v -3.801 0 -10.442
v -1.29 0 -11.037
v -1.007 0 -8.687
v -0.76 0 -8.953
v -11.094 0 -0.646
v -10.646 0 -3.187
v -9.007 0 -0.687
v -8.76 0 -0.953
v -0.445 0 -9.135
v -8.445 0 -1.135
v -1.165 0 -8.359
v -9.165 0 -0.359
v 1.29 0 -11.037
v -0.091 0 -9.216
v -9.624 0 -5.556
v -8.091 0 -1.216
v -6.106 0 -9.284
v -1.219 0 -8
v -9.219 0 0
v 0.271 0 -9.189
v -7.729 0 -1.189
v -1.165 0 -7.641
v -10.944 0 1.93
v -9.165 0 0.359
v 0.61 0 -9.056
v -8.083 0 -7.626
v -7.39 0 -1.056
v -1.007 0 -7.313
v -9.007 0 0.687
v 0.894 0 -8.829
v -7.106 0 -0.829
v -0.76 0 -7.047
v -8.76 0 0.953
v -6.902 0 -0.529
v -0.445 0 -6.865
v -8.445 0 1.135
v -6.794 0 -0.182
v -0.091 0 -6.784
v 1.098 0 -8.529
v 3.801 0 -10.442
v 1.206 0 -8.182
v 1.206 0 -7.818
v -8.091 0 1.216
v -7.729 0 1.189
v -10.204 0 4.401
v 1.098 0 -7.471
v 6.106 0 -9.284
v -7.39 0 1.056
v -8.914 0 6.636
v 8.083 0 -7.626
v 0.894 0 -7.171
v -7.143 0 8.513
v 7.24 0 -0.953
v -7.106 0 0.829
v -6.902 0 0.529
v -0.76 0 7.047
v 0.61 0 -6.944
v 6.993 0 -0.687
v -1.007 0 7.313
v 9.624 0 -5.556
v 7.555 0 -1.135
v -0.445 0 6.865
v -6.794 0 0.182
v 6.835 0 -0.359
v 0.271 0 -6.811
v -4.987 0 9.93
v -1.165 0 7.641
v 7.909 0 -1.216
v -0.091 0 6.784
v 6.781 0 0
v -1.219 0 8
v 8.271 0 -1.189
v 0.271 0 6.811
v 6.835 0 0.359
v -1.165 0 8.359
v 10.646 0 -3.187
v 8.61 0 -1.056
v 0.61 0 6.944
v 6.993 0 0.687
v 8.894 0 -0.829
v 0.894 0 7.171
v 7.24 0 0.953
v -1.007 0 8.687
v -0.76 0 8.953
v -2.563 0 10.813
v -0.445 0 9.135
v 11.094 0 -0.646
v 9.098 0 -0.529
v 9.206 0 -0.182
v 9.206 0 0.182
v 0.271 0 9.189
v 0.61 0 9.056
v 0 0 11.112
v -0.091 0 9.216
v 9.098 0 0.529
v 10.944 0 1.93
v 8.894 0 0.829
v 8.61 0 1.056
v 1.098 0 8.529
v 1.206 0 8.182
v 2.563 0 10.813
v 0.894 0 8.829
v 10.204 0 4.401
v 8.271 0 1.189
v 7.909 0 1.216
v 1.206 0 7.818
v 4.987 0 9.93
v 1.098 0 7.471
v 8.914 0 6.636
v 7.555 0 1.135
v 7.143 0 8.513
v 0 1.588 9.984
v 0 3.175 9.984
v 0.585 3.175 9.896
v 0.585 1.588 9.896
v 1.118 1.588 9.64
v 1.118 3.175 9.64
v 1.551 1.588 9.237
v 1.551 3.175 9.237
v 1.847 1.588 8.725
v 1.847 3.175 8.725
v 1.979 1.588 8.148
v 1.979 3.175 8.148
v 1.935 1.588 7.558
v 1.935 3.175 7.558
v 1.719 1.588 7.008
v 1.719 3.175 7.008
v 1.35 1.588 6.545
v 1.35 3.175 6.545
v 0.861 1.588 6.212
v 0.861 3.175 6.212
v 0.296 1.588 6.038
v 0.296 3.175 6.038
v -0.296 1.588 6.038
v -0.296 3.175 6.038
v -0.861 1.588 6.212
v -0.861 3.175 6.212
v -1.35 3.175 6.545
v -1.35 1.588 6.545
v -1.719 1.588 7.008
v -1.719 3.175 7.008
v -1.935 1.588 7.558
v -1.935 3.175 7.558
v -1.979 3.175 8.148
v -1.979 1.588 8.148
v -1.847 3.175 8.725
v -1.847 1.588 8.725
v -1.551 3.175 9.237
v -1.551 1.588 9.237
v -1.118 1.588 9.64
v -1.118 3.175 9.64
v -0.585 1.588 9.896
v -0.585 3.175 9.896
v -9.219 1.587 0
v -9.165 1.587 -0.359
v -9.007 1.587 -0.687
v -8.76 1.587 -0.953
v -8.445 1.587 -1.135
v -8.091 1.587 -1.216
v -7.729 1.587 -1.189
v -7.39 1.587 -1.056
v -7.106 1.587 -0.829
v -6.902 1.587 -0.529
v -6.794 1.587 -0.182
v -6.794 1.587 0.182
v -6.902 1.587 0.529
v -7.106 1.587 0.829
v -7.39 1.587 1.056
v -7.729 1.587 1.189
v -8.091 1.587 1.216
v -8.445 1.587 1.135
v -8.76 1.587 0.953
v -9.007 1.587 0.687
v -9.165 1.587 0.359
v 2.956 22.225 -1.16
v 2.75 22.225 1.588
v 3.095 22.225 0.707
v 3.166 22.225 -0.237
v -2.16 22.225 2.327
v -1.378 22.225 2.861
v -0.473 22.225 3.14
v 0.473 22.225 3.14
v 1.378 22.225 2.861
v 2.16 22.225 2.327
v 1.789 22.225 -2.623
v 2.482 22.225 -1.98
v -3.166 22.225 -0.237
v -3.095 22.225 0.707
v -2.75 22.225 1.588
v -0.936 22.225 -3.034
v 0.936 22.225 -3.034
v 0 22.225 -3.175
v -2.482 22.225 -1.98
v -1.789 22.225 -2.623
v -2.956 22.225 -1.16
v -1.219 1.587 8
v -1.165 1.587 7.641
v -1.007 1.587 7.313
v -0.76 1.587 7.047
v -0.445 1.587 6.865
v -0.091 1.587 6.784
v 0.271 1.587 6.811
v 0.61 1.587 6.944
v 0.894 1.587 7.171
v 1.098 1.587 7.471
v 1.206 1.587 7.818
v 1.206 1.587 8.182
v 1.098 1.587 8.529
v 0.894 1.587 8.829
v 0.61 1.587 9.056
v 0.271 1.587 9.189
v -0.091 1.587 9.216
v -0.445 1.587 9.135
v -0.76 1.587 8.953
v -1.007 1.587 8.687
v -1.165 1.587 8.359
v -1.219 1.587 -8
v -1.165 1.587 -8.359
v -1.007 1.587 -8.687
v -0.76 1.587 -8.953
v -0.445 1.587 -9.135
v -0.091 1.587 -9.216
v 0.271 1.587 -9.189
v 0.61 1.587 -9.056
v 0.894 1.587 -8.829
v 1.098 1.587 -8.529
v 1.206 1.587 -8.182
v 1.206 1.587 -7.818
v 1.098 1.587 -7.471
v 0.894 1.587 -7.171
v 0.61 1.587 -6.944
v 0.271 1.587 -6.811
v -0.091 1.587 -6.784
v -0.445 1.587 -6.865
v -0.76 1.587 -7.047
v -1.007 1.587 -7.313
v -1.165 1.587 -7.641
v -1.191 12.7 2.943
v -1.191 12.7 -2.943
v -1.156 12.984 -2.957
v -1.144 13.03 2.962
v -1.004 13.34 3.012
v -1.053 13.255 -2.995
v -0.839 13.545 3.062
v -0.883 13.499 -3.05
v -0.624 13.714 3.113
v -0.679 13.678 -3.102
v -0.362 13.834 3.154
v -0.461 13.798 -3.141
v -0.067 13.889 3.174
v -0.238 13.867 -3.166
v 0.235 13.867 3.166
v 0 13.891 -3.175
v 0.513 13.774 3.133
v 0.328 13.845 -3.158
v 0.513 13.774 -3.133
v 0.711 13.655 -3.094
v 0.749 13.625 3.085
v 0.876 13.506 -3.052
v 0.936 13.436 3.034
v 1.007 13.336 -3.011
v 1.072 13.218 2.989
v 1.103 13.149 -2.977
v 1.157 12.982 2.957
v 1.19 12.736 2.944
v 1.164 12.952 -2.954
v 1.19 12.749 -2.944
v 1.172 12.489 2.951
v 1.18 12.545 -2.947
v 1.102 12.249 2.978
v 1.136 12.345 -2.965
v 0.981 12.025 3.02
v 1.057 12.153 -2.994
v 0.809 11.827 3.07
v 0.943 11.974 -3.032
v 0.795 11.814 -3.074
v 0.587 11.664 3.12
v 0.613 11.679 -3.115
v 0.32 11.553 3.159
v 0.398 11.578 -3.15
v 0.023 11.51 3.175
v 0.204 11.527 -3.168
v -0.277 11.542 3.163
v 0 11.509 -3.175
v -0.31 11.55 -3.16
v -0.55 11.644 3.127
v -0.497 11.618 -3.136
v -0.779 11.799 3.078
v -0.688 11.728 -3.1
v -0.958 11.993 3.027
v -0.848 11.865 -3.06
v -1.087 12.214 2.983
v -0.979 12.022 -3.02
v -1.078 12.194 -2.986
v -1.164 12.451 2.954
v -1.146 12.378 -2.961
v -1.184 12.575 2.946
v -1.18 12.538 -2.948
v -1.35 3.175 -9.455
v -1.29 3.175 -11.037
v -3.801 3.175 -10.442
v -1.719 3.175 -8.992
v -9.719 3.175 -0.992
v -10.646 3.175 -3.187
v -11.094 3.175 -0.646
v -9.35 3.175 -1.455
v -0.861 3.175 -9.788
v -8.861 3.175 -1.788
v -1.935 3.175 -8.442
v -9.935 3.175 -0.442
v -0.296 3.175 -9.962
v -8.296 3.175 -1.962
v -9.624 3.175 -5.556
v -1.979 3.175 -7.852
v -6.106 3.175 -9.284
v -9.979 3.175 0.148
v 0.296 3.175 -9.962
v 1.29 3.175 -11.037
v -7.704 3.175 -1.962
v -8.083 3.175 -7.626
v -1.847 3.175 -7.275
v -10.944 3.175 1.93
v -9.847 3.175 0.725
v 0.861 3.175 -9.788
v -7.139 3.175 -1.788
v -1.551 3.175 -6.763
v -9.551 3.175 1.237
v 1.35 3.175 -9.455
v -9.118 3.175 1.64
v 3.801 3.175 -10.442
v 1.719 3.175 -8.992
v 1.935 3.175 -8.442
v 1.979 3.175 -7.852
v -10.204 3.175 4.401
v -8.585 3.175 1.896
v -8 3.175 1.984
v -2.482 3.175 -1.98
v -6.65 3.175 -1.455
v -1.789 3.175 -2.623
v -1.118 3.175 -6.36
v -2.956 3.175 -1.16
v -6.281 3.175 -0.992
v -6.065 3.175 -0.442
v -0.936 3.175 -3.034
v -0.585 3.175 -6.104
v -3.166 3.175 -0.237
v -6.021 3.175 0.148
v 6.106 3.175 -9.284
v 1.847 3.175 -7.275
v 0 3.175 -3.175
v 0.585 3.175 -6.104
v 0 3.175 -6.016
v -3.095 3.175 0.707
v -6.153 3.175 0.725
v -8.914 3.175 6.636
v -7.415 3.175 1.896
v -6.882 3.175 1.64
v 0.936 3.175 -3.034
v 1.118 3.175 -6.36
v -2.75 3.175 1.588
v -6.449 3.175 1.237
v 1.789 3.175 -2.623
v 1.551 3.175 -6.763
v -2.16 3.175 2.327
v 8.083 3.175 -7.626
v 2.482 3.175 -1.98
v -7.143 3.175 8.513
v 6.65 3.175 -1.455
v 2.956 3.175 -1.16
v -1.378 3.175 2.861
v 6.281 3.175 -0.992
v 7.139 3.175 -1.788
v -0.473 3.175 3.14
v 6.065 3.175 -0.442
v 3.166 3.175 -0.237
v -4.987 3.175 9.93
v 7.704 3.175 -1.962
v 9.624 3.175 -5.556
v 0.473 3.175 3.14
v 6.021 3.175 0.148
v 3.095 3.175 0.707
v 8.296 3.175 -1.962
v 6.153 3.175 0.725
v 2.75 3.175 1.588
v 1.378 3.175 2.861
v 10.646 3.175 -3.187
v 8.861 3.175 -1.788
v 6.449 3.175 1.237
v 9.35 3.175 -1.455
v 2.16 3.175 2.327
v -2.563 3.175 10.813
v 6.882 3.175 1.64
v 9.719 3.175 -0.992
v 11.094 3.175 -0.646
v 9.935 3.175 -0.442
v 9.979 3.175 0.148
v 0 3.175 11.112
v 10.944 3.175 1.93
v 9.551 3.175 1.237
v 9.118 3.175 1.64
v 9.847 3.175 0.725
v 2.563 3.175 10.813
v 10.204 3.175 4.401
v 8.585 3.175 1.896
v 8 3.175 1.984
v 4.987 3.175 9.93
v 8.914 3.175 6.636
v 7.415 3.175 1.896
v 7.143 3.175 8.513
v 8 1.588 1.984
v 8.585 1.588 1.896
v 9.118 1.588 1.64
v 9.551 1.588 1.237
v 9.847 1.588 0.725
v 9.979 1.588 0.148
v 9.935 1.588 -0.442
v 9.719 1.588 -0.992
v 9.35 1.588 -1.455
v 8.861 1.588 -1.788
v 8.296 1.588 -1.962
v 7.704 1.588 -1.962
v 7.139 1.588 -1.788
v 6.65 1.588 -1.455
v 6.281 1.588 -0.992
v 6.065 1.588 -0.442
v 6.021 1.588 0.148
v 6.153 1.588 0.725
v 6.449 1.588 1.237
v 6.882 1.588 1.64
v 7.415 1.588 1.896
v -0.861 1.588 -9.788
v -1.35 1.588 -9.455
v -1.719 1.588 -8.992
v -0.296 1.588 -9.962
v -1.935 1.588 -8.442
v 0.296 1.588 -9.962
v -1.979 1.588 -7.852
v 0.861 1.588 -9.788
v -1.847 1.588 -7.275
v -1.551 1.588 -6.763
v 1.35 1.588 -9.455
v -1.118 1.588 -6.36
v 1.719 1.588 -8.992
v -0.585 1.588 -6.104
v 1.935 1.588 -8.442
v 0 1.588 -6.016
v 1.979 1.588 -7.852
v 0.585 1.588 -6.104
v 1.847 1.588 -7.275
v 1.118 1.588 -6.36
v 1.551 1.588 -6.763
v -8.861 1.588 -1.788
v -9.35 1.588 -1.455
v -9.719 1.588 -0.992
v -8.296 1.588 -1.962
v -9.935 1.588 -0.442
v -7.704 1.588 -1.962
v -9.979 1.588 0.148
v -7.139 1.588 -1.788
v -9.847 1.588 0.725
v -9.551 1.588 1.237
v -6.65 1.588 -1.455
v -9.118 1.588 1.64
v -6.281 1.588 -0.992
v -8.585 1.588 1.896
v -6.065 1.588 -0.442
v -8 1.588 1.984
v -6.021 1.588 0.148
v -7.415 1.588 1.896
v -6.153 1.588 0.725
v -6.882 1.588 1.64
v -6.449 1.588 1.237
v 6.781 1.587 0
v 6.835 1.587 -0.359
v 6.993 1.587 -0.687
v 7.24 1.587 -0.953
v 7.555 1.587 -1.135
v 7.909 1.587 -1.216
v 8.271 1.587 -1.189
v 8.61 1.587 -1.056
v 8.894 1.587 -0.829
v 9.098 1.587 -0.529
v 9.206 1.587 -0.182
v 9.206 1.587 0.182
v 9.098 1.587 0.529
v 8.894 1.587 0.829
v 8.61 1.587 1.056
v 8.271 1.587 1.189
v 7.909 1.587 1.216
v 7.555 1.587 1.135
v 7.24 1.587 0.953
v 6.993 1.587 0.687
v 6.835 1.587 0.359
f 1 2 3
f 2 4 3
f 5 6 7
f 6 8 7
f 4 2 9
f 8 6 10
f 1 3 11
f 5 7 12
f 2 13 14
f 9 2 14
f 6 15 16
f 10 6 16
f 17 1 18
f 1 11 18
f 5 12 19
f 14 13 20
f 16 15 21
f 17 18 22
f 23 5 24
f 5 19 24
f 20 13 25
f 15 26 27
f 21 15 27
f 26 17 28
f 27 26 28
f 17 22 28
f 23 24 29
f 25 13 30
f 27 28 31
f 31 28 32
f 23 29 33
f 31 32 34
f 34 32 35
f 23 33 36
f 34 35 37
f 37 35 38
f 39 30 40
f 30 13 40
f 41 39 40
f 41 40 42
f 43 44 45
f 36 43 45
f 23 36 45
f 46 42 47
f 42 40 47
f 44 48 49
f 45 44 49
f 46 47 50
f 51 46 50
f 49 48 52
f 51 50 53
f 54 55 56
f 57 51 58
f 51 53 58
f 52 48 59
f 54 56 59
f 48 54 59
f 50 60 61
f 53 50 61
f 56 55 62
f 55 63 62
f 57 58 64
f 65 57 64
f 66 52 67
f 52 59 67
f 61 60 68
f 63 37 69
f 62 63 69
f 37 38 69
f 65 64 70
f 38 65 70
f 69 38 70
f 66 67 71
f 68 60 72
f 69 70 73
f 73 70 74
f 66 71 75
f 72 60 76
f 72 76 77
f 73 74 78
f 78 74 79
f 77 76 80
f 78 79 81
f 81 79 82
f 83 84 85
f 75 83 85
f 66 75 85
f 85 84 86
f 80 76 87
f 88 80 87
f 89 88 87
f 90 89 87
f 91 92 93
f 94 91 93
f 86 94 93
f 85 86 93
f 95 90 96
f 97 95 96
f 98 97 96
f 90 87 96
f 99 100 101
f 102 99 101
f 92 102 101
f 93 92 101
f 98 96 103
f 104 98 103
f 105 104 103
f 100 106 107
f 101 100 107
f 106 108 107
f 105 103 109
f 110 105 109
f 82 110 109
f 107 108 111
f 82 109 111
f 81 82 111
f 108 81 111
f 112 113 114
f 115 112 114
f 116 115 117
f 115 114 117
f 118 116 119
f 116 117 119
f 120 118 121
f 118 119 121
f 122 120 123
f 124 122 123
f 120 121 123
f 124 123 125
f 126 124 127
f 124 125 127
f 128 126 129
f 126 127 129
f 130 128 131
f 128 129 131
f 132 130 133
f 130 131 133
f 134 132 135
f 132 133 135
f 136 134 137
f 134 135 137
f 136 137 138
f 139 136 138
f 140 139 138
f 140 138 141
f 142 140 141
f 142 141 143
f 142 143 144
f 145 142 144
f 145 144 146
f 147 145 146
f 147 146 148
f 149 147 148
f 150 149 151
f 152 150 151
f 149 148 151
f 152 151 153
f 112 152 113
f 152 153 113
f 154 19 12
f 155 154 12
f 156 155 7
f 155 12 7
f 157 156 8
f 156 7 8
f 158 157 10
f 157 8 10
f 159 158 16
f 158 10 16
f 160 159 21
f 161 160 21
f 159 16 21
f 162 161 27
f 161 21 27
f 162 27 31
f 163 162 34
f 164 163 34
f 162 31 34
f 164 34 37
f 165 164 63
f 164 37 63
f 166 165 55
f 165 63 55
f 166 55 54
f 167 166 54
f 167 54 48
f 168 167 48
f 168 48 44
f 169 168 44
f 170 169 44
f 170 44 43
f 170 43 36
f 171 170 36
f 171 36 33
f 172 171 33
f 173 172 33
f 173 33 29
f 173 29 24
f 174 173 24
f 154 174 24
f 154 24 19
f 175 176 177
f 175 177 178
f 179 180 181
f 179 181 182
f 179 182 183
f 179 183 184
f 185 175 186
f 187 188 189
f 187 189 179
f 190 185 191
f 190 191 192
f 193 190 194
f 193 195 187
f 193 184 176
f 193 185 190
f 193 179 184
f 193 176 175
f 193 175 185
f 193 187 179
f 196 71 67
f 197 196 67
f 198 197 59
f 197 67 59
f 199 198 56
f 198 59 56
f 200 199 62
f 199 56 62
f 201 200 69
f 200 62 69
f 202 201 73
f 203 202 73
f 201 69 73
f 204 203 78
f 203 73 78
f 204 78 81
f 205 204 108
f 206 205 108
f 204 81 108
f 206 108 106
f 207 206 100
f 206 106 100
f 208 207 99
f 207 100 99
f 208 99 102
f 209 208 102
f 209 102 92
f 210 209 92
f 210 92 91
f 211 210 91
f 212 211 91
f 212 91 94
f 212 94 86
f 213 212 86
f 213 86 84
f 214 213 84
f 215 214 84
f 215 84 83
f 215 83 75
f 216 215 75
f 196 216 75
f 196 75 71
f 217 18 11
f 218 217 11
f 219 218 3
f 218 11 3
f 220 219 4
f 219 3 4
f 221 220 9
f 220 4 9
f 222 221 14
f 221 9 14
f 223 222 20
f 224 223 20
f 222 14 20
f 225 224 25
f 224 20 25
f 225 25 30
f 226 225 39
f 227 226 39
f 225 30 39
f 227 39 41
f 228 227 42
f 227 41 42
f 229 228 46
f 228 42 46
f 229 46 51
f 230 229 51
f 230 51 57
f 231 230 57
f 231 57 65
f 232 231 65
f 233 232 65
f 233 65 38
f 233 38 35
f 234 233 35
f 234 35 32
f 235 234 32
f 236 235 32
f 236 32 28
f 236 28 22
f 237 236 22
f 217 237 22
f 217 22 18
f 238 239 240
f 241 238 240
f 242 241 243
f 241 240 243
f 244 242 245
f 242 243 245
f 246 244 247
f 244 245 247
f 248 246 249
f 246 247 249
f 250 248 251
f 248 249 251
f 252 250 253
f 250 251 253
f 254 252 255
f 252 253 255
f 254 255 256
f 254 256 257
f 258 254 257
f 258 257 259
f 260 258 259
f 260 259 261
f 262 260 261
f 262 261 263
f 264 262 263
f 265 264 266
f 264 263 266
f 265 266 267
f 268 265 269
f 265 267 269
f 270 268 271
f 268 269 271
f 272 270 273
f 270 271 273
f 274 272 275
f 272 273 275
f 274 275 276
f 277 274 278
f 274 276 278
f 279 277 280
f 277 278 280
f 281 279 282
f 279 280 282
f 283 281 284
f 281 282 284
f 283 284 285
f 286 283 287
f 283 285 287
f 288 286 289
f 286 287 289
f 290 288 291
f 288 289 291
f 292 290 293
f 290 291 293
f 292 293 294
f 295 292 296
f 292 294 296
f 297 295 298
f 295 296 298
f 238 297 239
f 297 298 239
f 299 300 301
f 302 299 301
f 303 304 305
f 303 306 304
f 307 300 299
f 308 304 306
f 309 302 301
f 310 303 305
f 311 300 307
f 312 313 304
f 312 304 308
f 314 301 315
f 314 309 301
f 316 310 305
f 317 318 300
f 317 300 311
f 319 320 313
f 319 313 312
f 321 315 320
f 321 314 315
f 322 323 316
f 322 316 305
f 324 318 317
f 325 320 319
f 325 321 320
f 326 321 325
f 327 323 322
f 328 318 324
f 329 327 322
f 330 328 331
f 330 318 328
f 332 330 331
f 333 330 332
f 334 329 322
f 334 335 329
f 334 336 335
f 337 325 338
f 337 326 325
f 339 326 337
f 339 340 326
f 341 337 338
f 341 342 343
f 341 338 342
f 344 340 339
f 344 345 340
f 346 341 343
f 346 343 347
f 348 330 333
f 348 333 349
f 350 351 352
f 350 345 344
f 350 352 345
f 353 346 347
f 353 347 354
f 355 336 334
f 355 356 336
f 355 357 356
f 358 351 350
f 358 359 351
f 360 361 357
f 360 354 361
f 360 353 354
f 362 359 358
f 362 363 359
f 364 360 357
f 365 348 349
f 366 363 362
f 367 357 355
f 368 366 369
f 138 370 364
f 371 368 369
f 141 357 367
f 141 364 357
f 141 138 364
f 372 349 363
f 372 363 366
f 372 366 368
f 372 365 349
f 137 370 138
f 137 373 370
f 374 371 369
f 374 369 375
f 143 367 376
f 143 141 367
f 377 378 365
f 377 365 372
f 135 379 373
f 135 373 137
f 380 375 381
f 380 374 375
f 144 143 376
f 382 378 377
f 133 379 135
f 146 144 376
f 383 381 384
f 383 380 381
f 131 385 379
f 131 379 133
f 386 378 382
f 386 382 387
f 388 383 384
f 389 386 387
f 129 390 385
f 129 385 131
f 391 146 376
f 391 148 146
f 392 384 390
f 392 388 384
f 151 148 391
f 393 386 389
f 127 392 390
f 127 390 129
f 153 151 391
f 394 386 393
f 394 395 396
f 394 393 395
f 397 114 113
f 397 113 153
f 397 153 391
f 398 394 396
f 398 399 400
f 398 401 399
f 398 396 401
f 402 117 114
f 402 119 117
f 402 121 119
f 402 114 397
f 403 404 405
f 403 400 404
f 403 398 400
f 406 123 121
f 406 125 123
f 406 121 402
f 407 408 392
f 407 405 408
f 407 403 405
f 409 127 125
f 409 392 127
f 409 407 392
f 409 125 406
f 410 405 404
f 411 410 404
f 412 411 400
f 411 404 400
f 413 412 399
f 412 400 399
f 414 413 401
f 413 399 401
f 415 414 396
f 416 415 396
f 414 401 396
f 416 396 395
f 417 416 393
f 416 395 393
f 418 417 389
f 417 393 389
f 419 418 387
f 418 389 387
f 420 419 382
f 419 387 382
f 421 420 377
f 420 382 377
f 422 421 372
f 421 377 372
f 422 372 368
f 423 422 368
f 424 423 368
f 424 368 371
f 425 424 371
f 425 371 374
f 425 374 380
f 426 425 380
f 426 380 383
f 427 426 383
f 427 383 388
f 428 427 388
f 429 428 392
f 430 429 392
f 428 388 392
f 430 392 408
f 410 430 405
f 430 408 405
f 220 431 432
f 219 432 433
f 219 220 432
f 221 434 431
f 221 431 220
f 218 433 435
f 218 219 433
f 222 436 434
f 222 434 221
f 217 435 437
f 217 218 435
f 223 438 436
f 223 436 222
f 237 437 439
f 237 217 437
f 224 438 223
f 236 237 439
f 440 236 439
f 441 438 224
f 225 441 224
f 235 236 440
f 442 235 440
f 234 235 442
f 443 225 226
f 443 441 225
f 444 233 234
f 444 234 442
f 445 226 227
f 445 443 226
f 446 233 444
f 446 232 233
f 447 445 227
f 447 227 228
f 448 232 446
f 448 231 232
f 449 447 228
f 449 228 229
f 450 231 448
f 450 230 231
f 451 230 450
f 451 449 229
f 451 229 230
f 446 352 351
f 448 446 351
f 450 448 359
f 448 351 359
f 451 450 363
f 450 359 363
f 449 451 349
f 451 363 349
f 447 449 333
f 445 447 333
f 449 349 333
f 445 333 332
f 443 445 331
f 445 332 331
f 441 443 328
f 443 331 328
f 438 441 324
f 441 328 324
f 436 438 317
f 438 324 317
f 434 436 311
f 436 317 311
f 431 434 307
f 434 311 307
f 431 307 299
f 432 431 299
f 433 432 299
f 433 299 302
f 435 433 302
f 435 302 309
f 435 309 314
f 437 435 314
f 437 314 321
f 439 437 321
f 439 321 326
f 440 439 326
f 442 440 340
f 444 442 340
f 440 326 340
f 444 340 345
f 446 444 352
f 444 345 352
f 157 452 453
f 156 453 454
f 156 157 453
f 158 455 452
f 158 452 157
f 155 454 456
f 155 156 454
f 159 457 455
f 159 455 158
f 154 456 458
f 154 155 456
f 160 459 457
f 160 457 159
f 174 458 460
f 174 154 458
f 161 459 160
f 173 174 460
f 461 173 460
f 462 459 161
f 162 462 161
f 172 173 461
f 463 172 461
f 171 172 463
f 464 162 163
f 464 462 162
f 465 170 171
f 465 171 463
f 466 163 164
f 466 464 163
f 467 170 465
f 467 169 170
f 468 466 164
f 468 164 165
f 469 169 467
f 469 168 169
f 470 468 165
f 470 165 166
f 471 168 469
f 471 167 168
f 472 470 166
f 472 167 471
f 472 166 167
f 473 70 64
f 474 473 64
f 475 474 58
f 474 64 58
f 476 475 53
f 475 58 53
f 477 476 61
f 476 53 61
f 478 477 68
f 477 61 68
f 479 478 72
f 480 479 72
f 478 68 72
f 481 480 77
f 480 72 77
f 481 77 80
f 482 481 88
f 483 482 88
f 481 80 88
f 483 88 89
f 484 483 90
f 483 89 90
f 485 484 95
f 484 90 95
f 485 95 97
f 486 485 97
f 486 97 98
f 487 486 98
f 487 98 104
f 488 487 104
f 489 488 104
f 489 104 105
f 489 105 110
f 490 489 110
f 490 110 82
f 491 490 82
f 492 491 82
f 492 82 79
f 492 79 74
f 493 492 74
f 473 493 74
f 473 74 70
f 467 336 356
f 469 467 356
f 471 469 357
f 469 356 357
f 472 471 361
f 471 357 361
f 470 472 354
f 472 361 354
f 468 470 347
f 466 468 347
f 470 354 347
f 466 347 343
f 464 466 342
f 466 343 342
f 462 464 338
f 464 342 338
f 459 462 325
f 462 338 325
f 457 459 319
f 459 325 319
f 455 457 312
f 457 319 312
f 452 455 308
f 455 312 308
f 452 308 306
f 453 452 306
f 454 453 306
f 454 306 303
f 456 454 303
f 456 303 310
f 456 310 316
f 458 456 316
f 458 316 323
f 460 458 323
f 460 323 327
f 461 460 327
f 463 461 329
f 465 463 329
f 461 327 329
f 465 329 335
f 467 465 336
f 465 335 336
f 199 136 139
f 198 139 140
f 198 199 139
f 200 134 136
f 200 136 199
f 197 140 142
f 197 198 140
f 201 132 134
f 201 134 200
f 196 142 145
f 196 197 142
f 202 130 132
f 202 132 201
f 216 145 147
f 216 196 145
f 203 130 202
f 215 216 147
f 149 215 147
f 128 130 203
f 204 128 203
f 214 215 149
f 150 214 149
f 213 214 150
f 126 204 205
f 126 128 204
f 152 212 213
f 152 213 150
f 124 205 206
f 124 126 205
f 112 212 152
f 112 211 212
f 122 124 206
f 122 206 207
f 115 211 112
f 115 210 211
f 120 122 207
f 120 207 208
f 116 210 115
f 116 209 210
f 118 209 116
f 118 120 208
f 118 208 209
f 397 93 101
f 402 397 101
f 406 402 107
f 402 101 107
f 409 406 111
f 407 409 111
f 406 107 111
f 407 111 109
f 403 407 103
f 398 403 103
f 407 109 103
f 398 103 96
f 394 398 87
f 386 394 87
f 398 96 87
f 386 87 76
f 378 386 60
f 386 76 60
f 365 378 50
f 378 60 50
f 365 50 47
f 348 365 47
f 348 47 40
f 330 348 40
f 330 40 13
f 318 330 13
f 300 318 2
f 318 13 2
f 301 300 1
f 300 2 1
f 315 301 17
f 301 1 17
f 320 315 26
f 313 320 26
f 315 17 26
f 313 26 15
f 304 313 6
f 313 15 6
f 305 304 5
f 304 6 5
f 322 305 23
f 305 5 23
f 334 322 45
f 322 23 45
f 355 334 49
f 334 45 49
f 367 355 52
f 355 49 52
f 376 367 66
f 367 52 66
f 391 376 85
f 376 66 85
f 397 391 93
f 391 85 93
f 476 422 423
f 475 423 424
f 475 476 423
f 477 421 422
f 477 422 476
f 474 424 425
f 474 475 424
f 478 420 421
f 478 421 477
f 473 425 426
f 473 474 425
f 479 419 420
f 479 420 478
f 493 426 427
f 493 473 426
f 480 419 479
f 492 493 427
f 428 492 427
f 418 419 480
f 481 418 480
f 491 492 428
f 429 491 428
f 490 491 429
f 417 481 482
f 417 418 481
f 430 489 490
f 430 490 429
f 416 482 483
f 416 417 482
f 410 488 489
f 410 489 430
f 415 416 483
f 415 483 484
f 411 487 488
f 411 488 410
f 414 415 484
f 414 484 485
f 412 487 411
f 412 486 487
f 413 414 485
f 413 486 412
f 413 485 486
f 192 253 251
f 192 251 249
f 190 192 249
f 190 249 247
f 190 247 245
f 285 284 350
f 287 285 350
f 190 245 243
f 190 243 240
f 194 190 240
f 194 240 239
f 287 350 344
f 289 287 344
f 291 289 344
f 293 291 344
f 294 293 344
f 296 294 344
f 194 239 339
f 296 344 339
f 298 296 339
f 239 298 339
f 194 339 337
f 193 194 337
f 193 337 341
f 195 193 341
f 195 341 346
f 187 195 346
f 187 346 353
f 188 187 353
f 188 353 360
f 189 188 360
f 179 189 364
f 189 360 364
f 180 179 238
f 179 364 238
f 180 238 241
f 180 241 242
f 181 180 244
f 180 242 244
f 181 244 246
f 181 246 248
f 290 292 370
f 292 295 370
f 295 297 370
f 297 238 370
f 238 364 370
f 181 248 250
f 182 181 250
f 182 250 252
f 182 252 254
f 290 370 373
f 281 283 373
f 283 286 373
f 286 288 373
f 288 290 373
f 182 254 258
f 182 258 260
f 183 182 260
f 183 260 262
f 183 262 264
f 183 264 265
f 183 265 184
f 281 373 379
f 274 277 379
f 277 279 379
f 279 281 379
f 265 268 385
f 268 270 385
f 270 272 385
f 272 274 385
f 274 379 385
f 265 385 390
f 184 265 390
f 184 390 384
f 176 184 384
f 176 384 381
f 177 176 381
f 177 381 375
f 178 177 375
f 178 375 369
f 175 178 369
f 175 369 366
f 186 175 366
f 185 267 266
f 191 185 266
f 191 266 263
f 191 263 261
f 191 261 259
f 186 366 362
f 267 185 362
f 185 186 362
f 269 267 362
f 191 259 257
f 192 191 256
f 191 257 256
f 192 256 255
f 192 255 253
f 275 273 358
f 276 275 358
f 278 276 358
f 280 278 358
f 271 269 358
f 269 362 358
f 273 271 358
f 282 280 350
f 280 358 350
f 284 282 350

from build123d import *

# Parameters (mm, degrees)
SKETCH1_R                       = 11.1125
BOSS_EXTRUDE1_DEPTH             = 3.175
SKETCH2_R                       = 3.175
BOSS_EXTRUDE2_DEPTH             = 19.05
F_2_CLEARANCE_HOLE1_D           = 2.4384
SKETCH5_R                       = 1.984375
CUT_EXTRUDE1_DEPTH              = 1.5875
F_3_32_0_09375_DIAMETER_HOLE1_D = 2.38125


with BuildPart() as part:
    # Sketch1 → Boss-Extrude1 (new body)
    with BuildSketch(Plane(origin=(0, 0, 0), x_dir=(1, 0, 0), z_dir=(0, 1, 0))):
        with Locations(Location((0, 0, 0), (0, 0, 270))):
            Circle(SKETCH1_R)
    extrude(amount=BOSS_EXTRUDE1_DEPTH)

    # Sketch2 → Boss-Extrude2 (add)
    with BuildSketch(Plane(origin=(0, 3.175, 0), x_dir=(1, 0, 0), z_dir=(0, 1, 0))):
        with Locations(Location((0, 0, 0), (0, 0, 90))):
            Circle(SKETCH2_R)
    extrude(amount=BOSS_EXTRUDE2_DEPTH)

    # #2 Clearance Hole1 (through all)
    with Locations(Plane(origin=(0, 3.175, 0), x_dir=(1, 0, 0), z_dir=(0, 1, 0))):
        with Locations((0, -8), (0, 8), (-8, 0), (8, 0)):
            Hole(F_2_CLEARANCE_HOLE1_D / 2)

    # Sketch5 → Cut-Extrude1 (cut)
    with BuildSketch(Plane(origin=(0, 3.175, 0), x_dir=(1, 0, 0), z_dir=(0, 1, 0))):
        with Locations(Location((0, -8, 0), (0, 0, 270))):
            Circle(SKETCH5_R)
        with Locations(Location((8, 0, 0), (0, 0, 270))):
            Circle(SKETCH5_R)
        with Locations(Location((0, 8, 0), (0, 0, 270))):
            Circle(SKETCH5_R)
        with Locations(Location((-8, 0, 0), (0, 0, 270))):
            Circle(SKETCH5_R)
    extrude(amount=-CUT_EXTRUDE1_DEPTH, mode=Mode.SUBTRACT)

    # 3/32 (0.09375) Diameter Hole1 (through all)
    with Locations(Plane.XY.offset(3.175)):
        with Locations((0, 12.7)):
            Hole(F_3_32_0_09375_DIAMETER_HOLE1_D / 2)


solid = part.part
